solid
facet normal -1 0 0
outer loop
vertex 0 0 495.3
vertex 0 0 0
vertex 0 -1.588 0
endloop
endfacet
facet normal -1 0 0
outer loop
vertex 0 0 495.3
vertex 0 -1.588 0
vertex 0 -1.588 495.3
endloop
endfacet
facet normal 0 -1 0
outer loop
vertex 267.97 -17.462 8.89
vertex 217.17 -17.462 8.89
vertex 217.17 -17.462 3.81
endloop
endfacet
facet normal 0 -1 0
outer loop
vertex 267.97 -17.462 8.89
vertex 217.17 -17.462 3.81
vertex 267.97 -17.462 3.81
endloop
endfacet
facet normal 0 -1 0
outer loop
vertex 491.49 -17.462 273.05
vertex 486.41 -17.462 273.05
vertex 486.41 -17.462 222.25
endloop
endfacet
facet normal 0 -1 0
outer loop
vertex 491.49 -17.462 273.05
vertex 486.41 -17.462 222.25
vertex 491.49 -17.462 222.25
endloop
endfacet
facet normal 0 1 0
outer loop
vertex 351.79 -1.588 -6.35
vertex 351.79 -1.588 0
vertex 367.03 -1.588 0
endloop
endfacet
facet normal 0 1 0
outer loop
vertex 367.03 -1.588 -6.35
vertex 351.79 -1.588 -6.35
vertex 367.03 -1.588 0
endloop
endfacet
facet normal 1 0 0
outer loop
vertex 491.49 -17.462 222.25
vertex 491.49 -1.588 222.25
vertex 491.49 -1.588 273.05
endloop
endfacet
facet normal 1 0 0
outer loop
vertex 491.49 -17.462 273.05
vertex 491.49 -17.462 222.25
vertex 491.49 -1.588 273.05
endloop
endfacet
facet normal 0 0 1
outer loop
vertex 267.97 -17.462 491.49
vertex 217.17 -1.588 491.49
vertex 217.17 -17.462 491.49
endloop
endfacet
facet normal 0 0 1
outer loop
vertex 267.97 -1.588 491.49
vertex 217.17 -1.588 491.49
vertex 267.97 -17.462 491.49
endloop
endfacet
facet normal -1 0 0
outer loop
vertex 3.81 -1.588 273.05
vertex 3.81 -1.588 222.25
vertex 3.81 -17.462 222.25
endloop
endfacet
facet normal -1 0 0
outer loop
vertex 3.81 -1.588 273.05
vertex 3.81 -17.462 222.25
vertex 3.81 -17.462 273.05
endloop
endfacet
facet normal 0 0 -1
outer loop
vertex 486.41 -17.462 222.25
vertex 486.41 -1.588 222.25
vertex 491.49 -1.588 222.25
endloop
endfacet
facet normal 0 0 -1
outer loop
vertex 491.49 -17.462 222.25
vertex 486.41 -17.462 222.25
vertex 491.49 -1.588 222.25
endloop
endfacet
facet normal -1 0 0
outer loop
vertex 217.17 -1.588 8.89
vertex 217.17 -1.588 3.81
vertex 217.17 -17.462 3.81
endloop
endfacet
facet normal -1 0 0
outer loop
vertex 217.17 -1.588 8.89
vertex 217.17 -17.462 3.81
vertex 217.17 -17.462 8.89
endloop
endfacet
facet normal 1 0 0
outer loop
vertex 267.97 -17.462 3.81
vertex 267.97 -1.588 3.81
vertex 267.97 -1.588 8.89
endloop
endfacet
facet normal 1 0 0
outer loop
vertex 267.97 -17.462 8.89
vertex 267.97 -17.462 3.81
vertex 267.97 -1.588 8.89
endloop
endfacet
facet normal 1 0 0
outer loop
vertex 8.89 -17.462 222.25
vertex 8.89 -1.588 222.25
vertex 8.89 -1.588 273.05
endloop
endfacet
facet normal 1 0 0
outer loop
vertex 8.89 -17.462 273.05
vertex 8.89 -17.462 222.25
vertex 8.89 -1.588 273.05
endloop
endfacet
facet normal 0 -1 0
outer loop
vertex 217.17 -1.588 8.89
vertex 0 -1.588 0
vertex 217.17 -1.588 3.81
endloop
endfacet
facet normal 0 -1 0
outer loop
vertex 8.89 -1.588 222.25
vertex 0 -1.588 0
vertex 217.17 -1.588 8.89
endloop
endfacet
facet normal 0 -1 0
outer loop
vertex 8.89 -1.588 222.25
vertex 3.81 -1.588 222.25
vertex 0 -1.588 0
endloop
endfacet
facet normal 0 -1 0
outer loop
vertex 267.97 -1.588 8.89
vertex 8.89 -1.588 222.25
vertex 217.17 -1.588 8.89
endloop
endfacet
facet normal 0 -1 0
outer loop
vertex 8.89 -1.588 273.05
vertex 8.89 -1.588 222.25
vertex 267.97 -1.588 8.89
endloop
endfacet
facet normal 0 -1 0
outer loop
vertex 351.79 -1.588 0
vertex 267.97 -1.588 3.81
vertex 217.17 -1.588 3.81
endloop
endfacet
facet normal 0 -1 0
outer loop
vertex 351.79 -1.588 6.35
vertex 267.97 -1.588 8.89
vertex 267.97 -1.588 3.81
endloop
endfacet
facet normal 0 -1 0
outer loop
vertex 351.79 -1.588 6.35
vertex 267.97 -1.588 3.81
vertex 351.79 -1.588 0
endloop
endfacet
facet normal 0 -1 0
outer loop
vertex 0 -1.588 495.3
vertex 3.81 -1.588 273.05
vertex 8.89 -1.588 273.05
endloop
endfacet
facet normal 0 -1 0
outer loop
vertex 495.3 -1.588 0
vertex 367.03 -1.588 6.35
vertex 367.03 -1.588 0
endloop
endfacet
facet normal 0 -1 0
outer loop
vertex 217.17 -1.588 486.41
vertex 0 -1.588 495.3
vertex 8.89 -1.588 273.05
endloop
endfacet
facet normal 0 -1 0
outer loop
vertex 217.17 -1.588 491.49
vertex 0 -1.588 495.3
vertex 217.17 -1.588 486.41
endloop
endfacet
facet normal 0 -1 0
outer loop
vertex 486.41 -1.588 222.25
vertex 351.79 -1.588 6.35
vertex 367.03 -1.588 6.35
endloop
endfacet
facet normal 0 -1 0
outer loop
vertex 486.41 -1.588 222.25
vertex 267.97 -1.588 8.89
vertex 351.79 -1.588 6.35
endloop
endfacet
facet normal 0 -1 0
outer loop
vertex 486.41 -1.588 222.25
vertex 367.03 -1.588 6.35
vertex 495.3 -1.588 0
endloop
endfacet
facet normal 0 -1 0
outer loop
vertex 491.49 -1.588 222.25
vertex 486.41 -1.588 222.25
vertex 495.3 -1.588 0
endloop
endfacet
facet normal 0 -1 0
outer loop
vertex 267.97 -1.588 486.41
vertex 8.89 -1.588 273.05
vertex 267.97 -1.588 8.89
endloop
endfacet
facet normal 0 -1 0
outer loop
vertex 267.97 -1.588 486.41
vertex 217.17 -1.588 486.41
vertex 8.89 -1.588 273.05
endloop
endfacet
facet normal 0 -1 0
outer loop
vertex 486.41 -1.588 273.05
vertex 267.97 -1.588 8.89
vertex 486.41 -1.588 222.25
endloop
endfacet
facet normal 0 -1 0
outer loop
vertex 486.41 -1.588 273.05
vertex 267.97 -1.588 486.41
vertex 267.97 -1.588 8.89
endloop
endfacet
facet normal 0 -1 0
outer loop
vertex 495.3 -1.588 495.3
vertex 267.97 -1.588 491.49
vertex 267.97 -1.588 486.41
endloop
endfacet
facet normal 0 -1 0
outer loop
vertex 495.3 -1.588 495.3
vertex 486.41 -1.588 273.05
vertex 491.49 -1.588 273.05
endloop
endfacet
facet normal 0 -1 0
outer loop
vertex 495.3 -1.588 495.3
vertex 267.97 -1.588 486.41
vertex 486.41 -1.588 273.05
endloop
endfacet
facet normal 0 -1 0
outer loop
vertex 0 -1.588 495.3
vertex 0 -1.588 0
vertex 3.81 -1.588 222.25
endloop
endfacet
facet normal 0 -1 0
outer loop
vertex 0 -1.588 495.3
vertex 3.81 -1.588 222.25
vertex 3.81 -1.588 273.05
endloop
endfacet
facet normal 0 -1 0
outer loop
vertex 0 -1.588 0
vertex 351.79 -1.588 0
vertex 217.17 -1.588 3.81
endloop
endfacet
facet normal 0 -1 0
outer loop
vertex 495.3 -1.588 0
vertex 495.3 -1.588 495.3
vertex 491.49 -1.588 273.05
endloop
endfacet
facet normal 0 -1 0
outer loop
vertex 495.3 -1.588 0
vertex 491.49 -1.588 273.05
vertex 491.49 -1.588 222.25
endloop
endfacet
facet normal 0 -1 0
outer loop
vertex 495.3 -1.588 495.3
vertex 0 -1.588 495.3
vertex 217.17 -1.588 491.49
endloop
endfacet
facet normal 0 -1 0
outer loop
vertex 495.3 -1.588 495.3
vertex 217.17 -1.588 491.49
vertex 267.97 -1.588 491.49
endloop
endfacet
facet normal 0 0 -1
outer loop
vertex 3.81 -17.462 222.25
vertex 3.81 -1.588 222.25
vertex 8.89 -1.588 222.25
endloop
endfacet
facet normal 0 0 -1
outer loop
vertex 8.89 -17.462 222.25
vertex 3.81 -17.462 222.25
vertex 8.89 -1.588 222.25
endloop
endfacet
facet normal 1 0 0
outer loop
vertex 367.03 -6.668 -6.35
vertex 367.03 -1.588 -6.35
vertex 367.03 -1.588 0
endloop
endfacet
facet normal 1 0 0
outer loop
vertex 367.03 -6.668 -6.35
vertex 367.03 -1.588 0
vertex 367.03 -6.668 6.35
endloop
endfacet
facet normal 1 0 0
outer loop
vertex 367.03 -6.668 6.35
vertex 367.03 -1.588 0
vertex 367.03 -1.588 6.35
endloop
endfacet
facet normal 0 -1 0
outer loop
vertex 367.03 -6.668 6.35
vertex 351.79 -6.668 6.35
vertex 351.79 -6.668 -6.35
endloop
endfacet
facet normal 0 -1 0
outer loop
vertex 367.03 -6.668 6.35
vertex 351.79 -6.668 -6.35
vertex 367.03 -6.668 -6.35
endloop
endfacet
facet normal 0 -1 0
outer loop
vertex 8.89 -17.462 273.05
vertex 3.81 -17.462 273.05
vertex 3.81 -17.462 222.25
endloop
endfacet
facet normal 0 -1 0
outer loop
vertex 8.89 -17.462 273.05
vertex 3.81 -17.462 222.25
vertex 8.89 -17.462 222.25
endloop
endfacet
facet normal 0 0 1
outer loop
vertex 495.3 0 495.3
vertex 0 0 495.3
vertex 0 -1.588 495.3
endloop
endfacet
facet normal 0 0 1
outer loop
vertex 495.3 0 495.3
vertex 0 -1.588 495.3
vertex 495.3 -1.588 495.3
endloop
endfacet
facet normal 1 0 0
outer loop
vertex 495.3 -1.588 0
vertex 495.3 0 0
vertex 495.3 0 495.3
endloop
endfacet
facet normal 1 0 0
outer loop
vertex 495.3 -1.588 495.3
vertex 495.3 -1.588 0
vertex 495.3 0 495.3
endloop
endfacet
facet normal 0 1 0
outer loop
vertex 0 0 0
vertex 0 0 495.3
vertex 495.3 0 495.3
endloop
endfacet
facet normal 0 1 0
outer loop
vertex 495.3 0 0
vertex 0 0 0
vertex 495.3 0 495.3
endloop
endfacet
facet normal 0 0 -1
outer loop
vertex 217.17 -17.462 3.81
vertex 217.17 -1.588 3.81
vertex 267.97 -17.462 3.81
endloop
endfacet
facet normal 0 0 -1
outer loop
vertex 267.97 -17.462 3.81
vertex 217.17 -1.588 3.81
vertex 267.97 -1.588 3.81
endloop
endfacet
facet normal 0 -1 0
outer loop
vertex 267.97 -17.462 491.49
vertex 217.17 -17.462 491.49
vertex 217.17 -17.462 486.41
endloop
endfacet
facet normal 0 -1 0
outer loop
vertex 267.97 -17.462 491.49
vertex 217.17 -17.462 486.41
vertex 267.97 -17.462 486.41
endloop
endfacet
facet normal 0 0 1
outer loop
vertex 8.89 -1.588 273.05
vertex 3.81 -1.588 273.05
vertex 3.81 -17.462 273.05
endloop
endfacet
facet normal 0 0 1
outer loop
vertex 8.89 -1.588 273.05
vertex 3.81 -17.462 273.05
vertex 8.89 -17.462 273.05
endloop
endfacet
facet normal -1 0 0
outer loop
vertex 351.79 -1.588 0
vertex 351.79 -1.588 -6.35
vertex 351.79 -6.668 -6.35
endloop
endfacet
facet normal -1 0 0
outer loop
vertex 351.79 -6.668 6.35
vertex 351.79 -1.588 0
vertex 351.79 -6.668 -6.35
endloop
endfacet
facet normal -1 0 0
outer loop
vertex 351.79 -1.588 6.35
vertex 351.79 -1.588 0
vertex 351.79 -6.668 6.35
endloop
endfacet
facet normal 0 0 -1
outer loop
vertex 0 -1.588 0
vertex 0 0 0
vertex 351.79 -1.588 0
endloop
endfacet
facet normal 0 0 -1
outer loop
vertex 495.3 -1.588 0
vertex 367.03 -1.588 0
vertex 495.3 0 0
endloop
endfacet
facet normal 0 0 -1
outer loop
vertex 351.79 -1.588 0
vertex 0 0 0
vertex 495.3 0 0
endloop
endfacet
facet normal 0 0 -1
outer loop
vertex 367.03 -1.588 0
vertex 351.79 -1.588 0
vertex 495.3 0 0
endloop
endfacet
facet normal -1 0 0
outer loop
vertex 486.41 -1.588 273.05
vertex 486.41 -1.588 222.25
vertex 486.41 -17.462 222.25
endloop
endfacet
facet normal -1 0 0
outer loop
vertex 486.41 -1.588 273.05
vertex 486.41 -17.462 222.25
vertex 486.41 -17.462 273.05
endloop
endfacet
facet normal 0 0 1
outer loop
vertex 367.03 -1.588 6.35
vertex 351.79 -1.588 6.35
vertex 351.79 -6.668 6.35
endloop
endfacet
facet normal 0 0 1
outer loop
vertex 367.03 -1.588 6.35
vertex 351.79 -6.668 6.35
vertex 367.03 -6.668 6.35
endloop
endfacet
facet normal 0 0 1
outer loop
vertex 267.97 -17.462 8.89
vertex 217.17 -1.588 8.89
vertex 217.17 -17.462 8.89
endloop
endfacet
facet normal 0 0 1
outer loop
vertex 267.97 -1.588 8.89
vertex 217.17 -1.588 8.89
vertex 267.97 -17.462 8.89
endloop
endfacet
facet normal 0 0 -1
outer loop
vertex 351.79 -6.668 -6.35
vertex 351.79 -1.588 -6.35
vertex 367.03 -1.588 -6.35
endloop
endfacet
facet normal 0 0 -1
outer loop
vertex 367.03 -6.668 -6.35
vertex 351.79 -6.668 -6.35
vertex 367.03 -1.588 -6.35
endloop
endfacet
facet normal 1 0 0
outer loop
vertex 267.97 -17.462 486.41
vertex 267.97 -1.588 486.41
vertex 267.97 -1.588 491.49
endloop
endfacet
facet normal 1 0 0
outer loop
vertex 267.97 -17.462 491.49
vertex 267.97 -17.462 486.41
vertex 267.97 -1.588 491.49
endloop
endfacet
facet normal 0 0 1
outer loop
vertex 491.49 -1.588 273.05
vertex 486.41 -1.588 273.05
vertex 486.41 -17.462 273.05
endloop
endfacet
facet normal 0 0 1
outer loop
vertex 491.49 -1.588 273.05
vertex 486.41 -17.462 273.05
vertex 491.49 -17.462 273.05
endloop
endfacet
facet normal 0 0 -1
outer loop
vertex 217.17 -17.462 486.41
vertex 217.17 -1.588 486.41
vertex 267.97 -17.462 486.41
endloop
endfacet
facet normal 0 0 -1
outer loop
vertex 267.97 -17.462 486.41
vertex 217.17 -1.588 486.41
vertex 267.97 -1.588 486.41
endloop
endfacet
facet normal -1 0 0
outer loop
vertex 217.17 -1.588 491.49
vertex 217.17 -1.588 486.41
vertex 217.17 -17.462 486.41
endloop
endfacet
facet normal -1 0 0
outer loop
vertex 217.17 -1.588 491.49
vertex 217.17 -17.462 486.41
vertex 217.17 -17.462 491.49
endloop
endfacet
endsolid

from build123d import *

# Parameters (mm, degrees)
SKETCH_W     = 495.3
SKETCH_H     = 495.3
PAD_DEPTH    = 1.5875
BOX_W        = 5.08
BOX_H        = 50.8
BOX_DEPTH    = 15.875
BOX001_W     = 5.08
BOX001_H     = 50.8
BOX001_DEPTH = 15.875
BOX002_W     = 50.8
BOX002_H     = 5.08
BOX002_DEPTH = 15.875
BOX003_W     = 50.8
BOX003_H     = 5.08
BOX003_DEPTH = 15.875
BOX004_W     = 15.24
BOX004_H     = 12.7
BOX004_DEPTH = 5.08


with BuildPart() as part:
    # Sketch → Pad (new body)
    with BuildSketch(Plane.XZ):
        with Locations((247.65, 247.65)):
            Rectangle(SKETCH_W, SKETCH_H)
    extrude(amount=PAD_DEPTH)

    # Box → Box (join)
    with BuildSketch(Plane(origin=(3.81, -1.5875, 222.25), x_dir=(1, 0, 0), z_dir=(0, -1, 0))):
        with Locations((2.54, 25.4)):
            Rectangle(BOX_W, BOX_H)
    extrude(amount=BOX_DEPTH)

    # Box001 → Box001 (join)
    with BuildSketch(Plane(origin=(486.41, -1.5875, 222.25), x_dir=(1, 0, 0), z_dir=(0, -1, 0))):
        with Locations((2.54, 25.4)):
            Rectangle(BOX001_W, BOX001_H)
    extrude(amount=BOX001_DEPTH)

    # Box002 → Box002 (join)
    with BuildSketch(Plane(origin=(217.17, -1.5875, 3.81), x_dir=(1, 0, 0), z_dir=(0, -1, 0))):
        with Locations((25.4, 2.54)):
            Rectangle(BOX002_W, BOX002_H)
    extrude(amount=BOX002_DEPTH)

    # Box003 → Box003 (join)
    with BuildSketch(Plane(origin=(217.17, -1.5875, 486.41), x_dir=(1, 0, 0), z_dir=(0, -1, 0))):
        with Locations((25.4, 2.54)):
            Rectangle(BOX003_W, BOX003_H)
    extrude(amount=BOX003_DEPTH)

    # Box004 → Box004 (join)
    with BuildSketch(Plane(origin=(351.79, -1.5875, -6.35), x_dir=(1, 0, 0), z_dir=(0, -1, 0))):
        with Locations((7.62, 6.35)):
            Rectangle(BOX004_W, BOX004_H)
    extrude(amount=BOX004_DEPTH)


solid = part.part
